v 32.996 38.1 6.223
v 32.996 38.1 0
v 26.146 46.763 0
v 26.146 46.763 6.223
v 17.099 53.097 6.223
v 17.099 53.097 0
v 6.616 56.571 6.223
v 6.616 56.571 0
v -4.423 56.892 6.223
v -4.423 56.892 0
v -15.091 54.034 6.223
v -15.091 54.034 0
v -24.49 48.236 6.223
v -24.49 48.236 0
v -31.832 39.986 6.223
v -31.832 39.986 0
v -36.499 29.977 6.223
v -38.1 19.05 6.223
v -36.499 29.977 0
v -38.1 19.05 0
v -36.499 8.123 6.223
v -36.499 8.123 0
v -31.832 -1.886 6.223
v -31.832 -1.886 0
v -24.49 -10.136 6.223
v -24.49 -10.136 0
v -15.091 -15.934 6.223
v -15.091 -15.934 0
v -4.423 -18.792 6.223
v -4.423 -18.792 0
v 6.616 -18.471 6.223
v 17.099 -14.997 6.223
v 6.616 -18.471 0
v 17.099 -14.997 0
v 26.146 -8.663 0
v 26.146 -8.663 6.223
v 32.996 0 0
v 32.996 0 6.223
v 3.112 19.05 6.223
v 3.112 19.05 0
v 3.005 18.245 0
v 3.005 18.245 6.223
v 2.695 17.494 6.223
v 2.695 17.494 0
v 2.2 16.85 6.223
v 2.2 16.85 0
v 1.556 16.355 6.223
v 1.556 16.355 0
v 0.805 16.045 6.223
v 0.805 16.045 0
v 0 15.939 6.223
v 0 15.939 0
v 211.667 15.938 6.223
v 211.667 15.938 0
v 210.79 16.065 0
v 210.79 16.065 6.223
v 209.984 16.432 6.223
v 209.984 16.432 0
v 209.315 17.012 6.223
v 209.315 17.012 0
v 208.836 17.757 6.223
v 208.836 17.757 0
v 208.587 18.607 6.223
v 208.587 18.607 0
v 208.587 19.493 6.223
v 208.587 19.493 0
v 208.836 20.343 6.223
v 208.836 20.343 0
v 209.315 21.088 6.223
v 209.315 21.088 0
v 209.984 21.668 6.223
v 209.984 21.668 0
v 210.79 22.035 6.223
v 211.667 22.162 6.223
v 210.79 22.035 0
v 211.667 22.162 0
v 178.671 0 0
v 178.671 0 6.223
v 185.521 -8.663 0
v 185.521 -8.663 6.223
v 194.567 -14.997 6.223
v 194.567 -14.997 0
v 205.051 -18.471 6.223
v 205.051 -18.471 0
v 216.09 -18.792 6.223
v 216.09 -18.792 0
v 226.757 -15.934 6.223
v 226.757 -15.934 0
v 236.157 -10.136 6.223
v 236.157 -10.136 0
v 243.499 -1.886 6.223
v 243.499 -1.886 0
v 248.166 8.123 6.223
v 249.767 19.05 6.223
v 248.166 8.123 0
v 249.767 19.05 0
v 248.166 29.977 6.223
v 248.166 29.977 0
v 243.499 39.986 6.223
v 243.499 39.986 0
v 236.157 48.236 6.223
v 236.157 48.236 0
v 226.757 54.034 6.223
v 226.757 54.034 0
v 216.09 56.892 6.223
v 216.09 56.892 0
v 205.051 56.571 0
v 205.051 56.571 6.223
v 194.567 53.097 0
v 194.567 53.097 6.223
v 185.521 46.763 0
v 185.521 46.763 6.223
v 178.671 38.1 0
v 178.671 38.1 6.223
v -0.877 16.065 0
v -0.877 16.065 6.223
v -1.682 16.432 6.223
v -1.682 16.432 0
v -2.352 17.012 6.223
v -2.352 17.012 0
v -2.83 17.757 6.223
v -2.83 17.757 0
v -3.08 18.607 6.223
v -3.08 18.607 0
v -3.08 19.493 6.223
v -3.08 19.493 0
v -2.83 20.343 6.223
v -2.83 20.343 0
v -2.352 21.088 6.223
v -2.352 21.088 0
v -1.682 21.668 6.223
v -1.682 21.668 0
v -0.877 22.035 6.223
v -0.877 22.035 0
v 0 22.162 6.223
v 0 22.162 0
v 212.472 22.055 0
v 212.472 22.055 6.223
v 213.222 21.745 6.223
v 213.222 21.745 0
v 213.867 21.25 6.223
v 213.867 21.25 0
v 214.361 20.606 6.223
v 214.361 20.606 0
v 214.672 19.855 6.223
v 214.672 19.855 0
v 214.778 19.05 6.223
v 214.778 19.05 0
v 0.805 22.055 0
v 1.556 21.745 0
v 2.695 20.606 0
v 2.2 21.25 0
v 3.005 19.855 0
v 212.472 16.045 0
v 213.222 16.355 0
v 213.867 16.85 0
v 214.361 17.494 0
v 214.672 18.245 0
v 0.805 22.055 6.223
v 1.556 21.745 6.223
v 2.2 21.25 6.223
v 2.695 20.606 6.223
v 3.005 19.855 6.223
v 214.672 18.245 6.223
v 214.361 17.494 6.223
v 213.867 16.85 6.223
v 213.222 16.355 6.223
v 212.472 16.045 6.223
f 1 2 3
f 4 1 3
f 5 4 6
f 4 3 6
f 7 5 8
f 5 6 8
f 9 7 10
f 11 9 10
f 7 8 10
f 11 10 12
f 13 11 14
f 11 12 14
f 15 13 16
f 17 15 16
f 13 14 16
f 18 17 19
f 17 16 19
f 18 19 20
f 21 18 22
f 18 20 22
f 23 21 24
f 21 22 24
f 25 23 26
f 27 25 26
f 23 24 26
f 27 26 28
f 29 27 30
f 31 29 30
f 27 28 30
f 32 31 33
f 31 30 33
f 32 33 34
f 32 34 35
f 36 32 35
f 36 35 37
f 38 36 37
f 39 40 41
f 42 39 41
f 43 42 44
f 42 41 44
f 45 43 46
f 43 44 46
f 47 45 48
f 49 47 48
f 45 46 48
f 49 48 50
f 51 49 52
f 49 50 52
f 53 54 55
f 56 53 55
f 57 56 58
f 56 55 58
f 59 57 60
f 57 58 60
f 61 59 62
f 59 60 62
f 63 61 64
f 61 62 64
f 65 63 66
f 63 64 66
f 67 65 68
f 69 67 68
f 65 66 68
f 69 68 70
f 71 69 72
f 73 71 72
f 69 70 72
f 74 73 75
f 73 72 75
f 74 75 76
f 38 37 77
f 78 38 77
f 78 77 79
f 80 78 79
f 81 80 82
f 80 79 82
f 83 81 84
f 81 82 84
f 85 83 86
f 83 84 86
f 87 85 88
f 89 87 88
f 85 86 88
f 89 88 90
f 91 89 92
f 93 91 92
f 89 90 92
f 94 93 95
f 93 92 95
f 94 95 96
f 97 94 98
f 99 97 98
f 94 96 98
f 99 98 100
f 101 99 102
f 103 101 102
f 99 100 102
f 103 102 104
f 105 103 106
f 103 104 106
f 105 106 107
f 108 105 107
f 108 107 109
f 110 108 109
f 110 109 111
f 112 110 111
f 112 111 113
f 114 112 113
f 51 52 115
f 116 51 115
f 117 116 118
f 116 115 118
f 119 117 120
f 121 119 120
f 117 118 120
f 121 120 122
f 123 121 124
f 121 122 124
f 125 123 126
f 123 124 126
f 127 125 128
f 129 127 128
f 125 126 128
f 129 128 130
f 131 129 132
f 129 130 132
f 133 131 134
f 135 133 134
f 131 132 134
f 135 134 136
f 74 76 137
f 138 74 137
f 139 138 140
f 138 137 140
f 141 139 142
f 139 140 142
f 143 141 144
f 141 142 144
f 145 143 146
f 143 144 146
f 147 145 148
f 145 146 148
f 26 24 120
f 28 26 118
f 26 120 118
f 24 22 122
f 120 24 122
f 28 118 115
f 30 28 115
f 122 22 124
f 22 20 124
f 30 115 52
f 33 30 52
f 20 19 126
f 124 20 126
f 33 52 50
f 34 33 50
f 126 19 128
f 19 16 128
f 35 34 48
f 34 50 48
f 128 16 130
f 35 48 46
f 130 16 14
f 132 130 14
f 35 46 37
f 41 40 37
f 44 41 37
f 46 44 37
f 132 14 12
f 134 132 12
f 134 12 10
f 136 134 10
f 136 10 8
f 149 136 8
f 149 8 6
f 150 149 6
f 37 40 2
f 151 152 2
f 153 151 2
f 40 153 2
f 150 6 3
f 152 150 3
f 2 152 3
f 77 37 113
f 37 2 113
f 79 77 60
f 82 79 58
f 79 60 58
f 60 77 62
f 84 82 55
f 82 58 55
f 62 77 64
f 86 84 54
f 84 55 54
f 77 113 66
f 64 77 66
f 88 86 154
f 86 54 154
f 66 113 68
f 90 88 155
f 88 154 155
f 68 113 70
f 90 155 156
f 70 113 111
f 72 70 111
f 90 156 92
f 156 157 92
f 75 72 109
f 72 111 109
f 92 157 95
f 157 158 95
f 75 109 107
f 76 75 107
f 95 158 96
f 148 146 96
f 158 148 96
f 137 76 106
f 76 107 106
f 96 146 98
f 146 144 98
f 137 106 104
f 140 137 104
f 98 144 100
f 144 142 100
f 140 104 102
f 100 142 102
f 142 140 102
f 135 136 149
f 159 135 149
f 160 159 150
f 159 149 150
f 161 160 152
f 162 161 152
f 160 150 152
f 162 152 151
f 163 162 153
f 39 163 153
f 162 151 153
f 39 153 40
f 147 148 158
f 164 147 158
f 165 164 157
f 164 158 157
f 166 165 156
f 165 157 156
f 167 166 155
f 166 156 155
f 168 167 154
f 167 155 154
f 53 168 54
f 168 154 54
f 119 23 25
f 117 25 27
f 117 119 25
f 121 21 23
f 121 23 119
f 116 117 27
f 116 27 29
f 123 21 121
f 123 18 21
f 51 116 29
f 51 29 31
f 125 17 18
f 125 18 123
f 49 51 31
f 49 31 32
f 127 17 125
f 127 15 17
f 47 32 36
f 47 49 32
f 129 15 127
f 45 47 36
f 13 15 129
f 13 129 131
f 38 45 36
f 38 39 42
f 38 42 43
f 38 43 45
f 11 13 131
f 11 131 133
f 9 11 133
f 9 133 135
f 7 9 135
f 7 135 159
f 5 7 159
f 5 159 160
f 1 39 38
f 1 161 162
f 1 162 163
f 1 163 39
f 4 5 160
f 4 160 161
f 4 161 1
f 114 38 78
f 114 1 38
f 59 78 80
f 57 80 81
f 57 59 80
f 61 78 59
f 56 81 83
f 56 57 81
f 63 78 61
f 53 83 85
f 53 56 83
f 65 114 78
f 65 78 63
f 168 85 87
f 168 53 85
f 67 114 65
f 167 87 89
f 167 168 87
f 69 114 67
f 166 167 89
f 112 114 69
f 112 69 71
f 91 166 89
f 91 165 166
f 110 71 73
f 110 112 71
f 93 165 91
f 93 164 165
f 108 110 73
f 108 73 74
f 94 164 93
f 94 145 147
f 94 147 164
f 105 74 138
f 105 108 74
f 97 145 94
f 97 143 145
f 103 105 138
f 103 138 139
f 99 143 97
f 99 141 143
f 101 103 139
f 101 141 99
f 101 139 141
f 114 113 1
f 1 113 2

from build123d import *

# Parameters (mm, degrees)
BOSS_EXTRUDE1_DEPTH = 6.223


with BuildPart() as part:
    # Sketch1 → Boss-Extrude1 (new body)
    with BuildSketch(Plane.XY):
        with BuildLine():
            Line((0, 15.9385), (0, 0))
            Line((0, 0), (32.995567884, 0))
            ThreePointArc((32.995567884, 0), (36.801773982, 9.188994382), (38.1, 19.05))
            ThreePointArc((38.1, 19.05), (36.801773982, 28.911005618), (32.995567884, 38.1))
            Line((32.995567884, 38.1), (0, 38.1))
            Line((0, 38.1), (0, 22.1615))
            ThreePointArc((0, 22.1615), (2.20016275, 21.25016275), (3.1115, 19.05))
            ThreePointArc((3.1115, 19.05), (2.20016275, 16.84983725), (0, 15.9385))
        make_face()
        with BuildLine():
            Line((32.995567884, 0), (0, 0))
            Line((0, 0), (0, 15.9385))
            ThreePointArc((0, 15.9385), (-3.1115, 19.05), (0, 22.1615))
            Line((0, 22.1615), (0, 38.1))
            Line((0, 38.1), (32.995567884, 38.1))
            ThreePointArc((32.995567884, 38.1), (-38.1, 19.05), (32.995567884, 0))
        make_face()
        with BuildLine():
            ThreePointArc((38.1, 19.05), (36.801773982, 9.188994382), (32.995567884, 0))
            Line((32.995567884, 0), (178.671098782, 0))
            ThreePointArc((178.671098782, 0), (173.566666667, 19.05), (178.671098782, 38.1))
            Line((178.671098782, 38.1), (32.995567884, 38.1))
            ThreePointArc((32.995567884, 38.1), (36.801773982, 28.911005618), (38.1, 19.05))
        make_face()
        with BuildLine():
            ThreePointArc((178.671098782, 38.1), (173.566666667, 19.05), (178.671098782, 0))
            Line((178.671098782, 0), (211.666666667, 0))
            Line((211.666666667, 0), (211.666666667, 15.9385))
            ThreePointArc((211.666666667, 15.9385), (208.555166667, 19.05), (211.666666667, 22.1615))
            Line((211.666666667, 22.1615), (211.666666667, 38.1))
            Line((211.666666667, 38.1), (178.671098782, 38.1))
        make_face()
        with BuildLine():
            Line((211.666666667, 0), (178.671098782, 0))
            ThreePointArc((178.671098782, 0), (221.527672285, -17.751773982), (249.766666667, 19.05))
            ThreePointArc((249.766666667, 19.05), (221.527672285, 55.851773982), (178.671098782, 38.1))
            Line((178.671098782, 38.1), (211.666666667, 38.1))
            Line((211.666666667, 38.1), (211.666666667, 22.1615))
            ThreePointArc((211.666666667, 22.1615), (213.866829416, 21.25016275), (214.778166667, 19.05))
            ThreePointArc((214.778166667, 19.05), (213.866829416, 16.84983725), (211.666666667, 15.9385))
            Line((211.666666667, 15.9385), (211.666666667, 0))
        make_face()
    extrude(amount=BOSS_EXTRUDE1_DEPTH)


solid = part.part
